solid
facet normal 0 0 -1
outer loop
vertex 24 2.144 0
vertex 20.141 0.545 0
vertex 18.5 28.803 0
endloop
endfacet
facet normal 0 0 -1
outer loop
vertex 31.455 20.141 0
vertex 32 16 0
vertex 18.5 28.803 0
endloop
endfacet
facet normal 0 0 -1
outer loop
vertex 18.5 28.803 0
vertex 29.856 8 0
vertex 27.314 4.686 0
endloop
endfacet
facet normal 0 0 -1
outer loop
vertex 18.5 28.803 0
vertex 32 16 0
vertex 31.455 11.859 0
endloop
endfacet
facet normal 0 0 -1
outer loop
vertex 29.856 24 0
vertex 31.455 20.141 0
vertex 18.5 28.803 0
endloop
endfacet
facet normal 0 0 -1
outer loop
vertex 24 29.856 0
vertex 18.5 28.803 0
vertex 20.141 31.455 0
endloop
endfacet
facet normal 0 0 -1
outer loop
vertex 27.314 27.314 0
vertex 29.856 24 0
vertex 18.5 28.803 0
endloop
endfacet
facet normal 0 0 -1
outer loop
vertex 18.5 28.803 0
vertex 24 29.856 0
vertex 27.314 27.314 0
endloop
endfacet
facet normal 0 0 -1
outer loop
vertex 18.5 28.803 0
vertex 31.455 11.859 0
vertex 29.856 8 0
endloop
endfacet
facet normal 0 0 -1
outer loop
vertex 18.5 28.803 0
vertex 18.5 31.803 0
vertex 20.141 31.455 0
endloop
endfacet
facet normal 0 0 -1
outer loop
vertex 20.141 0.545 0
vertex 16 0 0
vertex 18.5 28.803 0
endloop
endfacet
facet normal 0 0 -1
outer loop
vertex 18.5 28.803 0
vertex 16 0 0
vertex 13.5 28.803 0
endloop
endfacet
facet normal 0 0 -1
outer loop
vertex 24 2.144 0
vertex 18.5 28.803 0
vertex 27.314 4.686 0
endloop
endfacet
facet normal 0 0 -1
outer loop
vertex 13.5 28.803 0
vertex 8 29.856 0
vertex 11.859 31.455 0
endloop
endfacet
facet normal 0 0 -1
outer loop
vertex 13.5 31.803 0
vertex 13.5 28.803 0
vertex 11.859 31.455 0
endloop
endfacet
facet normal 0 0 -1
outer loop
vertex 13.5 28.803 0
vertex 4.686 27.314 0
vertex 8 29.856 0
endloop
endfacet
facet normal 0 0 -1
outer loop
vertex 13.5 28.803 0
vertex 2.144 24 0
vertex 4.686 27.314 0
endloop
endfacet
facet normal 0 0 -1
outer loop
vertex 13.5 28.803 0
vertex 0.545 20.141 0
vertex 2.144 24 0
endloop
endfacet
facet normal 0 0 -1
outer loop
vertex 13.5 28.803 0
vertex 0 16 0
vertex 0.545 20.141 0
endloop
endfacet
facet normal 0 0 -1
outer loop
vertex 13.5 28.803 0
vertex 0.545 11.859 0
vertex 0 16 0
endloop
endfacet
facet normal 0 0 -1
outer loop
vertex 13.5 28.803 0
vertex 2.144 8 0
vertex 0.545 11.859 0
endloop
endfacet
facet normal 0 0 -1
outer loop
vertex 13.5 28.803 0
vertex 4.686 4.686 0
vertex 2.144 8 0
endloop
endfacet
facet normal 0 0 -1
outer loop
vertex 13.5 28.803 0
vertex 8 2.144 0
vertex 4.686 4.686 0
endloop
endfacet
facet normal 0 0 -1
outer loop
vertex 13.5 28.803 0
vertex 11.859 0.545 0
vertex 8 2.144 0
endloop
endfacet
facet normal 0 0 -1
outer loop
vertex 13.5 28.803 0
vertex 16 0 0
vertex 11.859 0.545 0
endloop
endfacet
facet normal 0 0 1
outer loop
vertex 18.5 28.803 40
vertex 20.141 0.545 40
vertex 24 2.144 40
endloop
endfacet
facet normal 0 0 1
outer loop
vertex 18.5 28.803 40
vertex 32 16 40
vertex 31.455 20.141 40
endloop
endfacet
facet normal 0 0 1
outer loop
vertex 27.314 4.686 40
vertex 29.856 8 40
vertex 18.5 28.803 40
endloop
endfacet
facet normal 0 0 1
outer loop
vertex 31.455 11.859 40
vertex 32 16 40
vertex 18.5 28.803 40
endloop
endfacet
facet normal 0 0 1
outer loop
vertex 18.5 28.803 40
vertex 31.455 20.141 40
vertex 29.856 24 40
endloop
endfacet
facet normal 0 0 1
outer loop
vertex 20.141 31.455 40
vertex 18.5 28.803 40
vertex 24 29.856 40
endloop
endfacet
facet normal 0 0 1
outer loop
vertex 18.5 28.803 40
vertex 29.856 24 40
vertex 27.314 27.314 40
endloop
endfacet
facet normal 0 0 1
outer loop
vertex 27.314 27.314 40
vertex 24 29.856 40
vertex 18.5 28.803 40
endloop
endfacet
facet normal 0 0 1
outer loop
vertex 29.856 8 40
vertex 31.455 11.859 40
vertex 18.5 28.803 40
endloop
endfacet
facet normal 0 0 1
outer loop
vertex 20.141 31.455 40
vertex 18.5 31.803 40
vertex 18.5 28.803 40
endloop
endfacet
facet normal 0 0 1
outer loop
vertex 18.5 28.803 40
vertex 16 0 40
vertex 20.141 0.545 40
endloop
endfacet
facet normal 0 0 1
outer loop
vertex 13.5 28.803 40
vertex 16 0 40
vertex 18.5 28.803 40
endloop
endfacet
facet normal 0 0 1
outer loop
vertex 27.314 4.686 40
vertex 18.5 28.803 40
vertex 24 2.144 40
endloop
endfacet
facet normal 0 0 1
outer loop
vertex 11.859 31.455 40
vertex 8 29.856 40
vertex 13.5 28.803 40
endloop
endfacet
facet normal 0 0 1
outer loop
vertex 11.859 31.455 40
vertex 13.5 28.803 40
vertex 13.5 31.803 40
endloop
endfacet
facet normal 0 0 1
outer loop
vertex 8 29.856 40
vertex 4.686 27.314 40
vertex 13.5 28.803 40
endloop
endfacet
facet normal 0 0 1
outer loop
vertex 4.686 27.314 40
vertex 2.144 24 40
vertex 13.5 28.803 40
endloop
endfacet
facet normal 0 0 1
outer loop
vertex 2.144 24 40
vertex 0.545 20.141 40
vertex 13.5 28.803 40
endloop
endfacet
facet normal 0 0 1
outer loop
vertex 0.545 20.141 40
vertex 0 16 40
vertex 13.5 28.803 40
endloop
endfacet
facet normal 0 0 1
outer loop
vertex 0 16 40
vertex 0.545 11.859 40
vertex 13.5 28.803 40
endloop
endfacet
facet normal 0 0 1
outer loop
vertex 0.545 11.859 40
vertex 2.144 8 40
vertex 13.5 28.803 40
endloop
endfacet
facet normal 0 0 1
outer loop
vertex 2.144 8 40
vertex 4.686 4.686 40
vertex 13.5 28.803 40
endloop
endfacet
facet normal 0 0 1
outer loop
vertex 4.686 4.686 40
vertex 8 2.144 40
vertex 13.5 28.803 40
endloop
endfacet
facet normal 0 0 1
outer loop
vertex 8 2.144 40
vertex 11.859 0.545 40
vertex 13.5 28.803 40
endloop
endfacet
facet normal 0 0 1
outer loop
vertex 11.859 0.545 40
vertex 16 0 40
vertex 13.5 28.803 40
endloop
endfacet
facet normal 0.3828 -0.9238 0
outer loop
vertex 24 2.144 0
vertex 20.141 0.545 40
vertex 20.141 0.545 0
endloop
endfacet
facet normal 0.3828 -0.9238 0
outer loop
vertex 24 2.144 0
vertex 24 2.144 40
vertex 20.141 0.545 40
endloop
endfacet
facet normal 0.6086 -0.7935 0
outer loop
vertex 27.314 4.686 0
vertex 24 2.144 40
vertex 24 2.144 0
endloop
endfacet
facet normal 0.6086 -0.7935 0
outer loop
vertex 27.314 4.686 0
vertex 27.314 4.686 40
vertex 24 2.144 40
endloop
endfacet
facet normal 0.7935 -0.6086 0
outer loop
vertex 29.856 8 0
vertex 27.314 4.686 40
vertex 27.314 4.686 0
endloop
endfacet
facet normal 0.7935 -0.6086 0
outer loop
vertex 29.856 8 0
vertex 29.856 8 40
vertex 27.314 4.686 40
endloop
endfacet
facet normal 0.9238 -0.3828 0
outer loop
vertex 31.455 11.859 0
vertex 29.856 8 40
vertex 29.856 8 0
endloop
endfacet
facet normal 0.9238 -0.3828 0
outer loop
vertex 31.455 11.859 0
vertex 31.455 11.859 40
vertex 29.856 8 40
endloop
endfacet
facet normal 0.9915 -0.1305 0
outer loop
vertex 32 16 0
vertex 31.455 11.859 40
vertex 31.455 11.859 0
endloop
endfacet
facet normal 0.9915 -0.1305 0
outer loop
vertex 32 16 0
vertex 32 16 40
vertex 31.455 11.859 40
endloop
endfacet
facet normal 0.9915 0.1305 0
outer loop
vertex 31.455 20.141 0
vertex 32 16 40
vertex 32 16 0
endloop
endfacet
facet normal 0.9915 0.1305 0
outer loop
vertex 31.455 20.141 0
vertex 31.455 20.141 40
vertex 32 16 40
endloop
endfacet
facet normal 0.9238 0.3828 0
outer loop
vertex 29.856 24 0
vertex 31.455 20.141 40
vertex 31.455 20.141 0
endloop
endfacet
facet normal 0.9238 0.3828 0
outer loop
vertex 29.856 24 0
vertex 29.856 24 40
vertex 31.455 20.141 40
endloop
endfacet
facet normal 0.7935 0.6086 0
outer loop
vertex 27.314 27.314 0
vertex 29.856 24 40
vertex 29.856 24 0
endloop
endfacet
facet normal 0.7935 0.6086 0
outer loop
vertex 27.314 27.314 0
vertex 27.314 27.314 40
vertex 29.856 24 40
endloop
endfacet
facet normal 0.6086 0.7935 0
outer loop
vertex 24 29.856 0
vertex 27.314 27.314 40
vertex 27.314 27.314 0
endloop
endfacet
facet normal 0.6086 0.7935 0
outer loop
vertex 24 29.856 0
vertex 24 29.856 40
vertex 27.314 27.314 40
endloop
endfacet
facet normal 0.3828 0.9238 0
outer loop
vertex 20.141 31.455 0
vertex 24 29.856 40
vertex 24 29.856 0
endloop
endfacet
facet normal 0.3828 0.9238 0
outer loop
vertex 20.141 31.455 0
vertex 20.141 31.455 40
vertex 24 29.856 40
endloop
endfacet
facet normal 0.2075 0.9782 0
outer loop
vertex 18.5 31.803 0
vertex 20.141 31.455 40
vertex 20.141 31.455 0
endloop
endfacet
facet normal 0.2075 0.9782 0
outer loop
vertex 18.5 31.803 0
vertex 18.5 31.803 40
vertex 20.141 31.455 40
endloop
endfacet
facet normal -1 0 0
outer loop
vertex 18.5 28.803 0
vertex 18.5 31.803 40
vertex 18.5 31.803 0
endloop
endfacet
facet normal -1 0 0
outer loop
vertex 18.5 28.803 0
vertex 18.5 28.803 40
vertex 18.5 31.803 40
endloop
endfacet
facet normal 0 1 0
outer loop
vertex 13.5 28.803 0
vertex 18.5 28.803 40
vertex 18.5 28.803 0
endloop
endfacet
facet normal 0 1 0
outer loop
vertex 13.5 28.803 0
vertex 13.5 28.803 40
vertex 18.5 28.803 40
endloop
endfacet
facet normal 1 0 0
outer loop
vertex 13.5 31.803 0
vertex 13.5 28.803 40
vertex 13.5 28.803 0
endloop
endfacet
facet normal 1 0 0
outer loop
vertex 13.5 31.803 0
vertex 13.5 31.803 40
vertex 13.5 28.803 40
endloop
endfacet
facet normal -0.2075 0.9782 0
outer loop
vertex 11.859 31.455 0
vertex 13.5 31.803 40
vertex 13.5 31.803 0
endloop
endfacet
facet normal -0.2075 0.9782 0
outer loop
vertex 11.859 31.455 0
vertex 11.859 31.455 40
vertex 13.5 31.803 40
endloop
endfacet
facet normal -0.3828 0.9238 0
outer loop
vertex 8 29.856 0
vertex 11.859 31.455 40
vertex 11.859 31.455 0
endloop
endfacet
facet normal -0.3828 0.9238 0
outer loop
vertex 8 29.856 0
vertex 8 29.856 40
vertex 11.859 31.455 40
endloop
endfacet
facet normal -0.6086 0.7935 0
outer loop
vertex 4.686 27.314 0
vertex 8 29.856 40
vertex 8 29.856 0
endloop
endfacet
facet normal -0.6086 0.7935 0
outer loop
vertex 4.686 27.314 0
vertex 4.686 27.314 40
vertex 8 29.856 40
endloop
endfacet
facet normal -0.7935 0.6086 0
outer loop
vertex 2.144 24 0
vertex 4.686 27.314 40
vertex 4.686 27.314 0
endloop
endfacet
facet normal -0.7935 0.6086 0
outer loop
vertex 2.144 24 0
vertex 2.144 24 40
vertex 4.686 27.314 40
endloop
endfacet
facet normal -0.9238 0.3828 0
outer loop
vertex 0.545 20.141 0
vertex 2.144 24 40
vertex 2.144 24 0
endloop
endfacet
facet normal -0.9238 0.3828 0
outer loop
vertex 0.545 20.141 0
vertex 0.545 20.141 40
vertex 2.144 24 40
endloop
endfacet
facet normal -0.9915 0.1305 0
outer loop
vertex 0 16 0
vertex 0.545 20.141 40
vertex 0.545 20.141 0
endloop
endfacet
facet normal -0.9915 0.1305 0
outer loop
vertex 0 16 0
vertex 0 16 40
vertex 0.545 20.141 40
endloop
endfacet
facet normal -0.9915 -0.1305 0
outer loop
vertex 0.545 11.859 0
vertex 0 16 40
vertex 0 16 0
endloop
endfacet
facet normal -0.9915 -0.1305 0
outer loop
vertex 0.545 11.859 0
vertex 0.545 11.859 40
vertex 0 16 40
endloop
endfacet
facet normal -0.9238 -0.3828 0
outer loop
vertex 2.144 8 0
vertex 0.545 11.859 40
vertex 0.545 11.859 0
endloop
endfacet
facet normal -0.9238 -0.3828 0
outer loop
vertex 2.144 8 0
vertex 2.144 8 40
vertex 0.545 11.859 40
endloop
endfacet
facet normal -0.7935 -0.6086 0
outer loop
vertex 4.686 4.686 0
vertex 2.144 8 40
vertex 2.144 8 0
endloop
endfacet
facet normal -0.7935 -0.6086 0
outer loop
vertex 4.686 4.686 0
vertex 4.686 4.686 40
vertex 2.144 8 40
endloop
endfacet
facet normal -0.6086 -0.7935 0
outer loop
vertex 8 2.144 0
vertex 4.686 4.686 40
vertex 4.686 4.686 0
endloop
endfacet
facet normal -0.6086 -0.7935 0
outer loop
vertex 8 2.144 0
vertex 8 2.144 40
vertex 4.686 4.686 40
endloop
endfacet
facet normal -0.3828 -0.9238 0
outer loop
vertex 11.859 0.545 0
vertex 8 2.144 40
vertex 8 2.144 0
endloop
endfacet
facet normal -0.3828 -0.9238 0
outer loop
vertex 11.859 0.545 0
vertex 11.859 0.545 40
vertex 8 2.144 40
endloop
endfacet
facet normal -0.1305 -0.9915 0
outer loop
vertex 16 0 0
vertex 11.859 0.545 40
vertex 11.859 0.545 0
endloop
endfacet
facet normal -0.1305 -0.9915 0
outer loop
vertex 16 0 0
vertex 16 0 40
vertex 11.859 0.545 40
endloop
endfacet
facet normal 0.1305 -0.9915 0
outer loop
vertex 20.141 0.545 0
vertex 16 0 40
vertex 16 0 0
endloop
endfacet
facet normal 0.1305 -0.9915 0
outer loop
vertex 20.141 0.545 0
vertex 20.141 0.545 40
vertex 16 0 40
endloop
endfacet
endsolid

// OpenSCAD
$fn = 32;

// ----------------------------------------------------------------------
// Keyway shaft: d32 shaft, key 5 x 3 mm
// ----------------------------------------------------------------------

// --- parameters (mm) ---
shaft_r = 16;             // shaft radius
key_w = 5;                // keyway width
key_d = 3;                // keyway depth below the surface line
plate_t = 40;             // shaft length, Z (extrusion height)

shaft_d = 2 * shaft_r;  // shaft diameter
circle_step = 15;  // polygon sampling step, degrees

profile = [[11.859, 31.455], [8, 29.856], [4.686, 27.314], [2.144, 24], [0.545, 20.141], [0, 16], [0.545, 11.859], [2.144, 8], [4.686, 4.686], [8, 2.144], [11.859, 0.545], [16, 0], [20.141, 0.545], [24, 2.144], [27.314, 4.686], [29.856, 8], [31.455, 11.859], [32, 16], [31.455, 20.141], [29.856, 24], [27.314, 27.314], [24, 29.856], [20.141, 31.455], [18.5, 31.803], [18.5, 28.803], [13.5, 28.803], [13.5, 31.803]];  // primary outline, 27 points, counter clockwise

// --- the one profile operation ---
linear_extrude(height = plate_t) polygon(points = profile);
